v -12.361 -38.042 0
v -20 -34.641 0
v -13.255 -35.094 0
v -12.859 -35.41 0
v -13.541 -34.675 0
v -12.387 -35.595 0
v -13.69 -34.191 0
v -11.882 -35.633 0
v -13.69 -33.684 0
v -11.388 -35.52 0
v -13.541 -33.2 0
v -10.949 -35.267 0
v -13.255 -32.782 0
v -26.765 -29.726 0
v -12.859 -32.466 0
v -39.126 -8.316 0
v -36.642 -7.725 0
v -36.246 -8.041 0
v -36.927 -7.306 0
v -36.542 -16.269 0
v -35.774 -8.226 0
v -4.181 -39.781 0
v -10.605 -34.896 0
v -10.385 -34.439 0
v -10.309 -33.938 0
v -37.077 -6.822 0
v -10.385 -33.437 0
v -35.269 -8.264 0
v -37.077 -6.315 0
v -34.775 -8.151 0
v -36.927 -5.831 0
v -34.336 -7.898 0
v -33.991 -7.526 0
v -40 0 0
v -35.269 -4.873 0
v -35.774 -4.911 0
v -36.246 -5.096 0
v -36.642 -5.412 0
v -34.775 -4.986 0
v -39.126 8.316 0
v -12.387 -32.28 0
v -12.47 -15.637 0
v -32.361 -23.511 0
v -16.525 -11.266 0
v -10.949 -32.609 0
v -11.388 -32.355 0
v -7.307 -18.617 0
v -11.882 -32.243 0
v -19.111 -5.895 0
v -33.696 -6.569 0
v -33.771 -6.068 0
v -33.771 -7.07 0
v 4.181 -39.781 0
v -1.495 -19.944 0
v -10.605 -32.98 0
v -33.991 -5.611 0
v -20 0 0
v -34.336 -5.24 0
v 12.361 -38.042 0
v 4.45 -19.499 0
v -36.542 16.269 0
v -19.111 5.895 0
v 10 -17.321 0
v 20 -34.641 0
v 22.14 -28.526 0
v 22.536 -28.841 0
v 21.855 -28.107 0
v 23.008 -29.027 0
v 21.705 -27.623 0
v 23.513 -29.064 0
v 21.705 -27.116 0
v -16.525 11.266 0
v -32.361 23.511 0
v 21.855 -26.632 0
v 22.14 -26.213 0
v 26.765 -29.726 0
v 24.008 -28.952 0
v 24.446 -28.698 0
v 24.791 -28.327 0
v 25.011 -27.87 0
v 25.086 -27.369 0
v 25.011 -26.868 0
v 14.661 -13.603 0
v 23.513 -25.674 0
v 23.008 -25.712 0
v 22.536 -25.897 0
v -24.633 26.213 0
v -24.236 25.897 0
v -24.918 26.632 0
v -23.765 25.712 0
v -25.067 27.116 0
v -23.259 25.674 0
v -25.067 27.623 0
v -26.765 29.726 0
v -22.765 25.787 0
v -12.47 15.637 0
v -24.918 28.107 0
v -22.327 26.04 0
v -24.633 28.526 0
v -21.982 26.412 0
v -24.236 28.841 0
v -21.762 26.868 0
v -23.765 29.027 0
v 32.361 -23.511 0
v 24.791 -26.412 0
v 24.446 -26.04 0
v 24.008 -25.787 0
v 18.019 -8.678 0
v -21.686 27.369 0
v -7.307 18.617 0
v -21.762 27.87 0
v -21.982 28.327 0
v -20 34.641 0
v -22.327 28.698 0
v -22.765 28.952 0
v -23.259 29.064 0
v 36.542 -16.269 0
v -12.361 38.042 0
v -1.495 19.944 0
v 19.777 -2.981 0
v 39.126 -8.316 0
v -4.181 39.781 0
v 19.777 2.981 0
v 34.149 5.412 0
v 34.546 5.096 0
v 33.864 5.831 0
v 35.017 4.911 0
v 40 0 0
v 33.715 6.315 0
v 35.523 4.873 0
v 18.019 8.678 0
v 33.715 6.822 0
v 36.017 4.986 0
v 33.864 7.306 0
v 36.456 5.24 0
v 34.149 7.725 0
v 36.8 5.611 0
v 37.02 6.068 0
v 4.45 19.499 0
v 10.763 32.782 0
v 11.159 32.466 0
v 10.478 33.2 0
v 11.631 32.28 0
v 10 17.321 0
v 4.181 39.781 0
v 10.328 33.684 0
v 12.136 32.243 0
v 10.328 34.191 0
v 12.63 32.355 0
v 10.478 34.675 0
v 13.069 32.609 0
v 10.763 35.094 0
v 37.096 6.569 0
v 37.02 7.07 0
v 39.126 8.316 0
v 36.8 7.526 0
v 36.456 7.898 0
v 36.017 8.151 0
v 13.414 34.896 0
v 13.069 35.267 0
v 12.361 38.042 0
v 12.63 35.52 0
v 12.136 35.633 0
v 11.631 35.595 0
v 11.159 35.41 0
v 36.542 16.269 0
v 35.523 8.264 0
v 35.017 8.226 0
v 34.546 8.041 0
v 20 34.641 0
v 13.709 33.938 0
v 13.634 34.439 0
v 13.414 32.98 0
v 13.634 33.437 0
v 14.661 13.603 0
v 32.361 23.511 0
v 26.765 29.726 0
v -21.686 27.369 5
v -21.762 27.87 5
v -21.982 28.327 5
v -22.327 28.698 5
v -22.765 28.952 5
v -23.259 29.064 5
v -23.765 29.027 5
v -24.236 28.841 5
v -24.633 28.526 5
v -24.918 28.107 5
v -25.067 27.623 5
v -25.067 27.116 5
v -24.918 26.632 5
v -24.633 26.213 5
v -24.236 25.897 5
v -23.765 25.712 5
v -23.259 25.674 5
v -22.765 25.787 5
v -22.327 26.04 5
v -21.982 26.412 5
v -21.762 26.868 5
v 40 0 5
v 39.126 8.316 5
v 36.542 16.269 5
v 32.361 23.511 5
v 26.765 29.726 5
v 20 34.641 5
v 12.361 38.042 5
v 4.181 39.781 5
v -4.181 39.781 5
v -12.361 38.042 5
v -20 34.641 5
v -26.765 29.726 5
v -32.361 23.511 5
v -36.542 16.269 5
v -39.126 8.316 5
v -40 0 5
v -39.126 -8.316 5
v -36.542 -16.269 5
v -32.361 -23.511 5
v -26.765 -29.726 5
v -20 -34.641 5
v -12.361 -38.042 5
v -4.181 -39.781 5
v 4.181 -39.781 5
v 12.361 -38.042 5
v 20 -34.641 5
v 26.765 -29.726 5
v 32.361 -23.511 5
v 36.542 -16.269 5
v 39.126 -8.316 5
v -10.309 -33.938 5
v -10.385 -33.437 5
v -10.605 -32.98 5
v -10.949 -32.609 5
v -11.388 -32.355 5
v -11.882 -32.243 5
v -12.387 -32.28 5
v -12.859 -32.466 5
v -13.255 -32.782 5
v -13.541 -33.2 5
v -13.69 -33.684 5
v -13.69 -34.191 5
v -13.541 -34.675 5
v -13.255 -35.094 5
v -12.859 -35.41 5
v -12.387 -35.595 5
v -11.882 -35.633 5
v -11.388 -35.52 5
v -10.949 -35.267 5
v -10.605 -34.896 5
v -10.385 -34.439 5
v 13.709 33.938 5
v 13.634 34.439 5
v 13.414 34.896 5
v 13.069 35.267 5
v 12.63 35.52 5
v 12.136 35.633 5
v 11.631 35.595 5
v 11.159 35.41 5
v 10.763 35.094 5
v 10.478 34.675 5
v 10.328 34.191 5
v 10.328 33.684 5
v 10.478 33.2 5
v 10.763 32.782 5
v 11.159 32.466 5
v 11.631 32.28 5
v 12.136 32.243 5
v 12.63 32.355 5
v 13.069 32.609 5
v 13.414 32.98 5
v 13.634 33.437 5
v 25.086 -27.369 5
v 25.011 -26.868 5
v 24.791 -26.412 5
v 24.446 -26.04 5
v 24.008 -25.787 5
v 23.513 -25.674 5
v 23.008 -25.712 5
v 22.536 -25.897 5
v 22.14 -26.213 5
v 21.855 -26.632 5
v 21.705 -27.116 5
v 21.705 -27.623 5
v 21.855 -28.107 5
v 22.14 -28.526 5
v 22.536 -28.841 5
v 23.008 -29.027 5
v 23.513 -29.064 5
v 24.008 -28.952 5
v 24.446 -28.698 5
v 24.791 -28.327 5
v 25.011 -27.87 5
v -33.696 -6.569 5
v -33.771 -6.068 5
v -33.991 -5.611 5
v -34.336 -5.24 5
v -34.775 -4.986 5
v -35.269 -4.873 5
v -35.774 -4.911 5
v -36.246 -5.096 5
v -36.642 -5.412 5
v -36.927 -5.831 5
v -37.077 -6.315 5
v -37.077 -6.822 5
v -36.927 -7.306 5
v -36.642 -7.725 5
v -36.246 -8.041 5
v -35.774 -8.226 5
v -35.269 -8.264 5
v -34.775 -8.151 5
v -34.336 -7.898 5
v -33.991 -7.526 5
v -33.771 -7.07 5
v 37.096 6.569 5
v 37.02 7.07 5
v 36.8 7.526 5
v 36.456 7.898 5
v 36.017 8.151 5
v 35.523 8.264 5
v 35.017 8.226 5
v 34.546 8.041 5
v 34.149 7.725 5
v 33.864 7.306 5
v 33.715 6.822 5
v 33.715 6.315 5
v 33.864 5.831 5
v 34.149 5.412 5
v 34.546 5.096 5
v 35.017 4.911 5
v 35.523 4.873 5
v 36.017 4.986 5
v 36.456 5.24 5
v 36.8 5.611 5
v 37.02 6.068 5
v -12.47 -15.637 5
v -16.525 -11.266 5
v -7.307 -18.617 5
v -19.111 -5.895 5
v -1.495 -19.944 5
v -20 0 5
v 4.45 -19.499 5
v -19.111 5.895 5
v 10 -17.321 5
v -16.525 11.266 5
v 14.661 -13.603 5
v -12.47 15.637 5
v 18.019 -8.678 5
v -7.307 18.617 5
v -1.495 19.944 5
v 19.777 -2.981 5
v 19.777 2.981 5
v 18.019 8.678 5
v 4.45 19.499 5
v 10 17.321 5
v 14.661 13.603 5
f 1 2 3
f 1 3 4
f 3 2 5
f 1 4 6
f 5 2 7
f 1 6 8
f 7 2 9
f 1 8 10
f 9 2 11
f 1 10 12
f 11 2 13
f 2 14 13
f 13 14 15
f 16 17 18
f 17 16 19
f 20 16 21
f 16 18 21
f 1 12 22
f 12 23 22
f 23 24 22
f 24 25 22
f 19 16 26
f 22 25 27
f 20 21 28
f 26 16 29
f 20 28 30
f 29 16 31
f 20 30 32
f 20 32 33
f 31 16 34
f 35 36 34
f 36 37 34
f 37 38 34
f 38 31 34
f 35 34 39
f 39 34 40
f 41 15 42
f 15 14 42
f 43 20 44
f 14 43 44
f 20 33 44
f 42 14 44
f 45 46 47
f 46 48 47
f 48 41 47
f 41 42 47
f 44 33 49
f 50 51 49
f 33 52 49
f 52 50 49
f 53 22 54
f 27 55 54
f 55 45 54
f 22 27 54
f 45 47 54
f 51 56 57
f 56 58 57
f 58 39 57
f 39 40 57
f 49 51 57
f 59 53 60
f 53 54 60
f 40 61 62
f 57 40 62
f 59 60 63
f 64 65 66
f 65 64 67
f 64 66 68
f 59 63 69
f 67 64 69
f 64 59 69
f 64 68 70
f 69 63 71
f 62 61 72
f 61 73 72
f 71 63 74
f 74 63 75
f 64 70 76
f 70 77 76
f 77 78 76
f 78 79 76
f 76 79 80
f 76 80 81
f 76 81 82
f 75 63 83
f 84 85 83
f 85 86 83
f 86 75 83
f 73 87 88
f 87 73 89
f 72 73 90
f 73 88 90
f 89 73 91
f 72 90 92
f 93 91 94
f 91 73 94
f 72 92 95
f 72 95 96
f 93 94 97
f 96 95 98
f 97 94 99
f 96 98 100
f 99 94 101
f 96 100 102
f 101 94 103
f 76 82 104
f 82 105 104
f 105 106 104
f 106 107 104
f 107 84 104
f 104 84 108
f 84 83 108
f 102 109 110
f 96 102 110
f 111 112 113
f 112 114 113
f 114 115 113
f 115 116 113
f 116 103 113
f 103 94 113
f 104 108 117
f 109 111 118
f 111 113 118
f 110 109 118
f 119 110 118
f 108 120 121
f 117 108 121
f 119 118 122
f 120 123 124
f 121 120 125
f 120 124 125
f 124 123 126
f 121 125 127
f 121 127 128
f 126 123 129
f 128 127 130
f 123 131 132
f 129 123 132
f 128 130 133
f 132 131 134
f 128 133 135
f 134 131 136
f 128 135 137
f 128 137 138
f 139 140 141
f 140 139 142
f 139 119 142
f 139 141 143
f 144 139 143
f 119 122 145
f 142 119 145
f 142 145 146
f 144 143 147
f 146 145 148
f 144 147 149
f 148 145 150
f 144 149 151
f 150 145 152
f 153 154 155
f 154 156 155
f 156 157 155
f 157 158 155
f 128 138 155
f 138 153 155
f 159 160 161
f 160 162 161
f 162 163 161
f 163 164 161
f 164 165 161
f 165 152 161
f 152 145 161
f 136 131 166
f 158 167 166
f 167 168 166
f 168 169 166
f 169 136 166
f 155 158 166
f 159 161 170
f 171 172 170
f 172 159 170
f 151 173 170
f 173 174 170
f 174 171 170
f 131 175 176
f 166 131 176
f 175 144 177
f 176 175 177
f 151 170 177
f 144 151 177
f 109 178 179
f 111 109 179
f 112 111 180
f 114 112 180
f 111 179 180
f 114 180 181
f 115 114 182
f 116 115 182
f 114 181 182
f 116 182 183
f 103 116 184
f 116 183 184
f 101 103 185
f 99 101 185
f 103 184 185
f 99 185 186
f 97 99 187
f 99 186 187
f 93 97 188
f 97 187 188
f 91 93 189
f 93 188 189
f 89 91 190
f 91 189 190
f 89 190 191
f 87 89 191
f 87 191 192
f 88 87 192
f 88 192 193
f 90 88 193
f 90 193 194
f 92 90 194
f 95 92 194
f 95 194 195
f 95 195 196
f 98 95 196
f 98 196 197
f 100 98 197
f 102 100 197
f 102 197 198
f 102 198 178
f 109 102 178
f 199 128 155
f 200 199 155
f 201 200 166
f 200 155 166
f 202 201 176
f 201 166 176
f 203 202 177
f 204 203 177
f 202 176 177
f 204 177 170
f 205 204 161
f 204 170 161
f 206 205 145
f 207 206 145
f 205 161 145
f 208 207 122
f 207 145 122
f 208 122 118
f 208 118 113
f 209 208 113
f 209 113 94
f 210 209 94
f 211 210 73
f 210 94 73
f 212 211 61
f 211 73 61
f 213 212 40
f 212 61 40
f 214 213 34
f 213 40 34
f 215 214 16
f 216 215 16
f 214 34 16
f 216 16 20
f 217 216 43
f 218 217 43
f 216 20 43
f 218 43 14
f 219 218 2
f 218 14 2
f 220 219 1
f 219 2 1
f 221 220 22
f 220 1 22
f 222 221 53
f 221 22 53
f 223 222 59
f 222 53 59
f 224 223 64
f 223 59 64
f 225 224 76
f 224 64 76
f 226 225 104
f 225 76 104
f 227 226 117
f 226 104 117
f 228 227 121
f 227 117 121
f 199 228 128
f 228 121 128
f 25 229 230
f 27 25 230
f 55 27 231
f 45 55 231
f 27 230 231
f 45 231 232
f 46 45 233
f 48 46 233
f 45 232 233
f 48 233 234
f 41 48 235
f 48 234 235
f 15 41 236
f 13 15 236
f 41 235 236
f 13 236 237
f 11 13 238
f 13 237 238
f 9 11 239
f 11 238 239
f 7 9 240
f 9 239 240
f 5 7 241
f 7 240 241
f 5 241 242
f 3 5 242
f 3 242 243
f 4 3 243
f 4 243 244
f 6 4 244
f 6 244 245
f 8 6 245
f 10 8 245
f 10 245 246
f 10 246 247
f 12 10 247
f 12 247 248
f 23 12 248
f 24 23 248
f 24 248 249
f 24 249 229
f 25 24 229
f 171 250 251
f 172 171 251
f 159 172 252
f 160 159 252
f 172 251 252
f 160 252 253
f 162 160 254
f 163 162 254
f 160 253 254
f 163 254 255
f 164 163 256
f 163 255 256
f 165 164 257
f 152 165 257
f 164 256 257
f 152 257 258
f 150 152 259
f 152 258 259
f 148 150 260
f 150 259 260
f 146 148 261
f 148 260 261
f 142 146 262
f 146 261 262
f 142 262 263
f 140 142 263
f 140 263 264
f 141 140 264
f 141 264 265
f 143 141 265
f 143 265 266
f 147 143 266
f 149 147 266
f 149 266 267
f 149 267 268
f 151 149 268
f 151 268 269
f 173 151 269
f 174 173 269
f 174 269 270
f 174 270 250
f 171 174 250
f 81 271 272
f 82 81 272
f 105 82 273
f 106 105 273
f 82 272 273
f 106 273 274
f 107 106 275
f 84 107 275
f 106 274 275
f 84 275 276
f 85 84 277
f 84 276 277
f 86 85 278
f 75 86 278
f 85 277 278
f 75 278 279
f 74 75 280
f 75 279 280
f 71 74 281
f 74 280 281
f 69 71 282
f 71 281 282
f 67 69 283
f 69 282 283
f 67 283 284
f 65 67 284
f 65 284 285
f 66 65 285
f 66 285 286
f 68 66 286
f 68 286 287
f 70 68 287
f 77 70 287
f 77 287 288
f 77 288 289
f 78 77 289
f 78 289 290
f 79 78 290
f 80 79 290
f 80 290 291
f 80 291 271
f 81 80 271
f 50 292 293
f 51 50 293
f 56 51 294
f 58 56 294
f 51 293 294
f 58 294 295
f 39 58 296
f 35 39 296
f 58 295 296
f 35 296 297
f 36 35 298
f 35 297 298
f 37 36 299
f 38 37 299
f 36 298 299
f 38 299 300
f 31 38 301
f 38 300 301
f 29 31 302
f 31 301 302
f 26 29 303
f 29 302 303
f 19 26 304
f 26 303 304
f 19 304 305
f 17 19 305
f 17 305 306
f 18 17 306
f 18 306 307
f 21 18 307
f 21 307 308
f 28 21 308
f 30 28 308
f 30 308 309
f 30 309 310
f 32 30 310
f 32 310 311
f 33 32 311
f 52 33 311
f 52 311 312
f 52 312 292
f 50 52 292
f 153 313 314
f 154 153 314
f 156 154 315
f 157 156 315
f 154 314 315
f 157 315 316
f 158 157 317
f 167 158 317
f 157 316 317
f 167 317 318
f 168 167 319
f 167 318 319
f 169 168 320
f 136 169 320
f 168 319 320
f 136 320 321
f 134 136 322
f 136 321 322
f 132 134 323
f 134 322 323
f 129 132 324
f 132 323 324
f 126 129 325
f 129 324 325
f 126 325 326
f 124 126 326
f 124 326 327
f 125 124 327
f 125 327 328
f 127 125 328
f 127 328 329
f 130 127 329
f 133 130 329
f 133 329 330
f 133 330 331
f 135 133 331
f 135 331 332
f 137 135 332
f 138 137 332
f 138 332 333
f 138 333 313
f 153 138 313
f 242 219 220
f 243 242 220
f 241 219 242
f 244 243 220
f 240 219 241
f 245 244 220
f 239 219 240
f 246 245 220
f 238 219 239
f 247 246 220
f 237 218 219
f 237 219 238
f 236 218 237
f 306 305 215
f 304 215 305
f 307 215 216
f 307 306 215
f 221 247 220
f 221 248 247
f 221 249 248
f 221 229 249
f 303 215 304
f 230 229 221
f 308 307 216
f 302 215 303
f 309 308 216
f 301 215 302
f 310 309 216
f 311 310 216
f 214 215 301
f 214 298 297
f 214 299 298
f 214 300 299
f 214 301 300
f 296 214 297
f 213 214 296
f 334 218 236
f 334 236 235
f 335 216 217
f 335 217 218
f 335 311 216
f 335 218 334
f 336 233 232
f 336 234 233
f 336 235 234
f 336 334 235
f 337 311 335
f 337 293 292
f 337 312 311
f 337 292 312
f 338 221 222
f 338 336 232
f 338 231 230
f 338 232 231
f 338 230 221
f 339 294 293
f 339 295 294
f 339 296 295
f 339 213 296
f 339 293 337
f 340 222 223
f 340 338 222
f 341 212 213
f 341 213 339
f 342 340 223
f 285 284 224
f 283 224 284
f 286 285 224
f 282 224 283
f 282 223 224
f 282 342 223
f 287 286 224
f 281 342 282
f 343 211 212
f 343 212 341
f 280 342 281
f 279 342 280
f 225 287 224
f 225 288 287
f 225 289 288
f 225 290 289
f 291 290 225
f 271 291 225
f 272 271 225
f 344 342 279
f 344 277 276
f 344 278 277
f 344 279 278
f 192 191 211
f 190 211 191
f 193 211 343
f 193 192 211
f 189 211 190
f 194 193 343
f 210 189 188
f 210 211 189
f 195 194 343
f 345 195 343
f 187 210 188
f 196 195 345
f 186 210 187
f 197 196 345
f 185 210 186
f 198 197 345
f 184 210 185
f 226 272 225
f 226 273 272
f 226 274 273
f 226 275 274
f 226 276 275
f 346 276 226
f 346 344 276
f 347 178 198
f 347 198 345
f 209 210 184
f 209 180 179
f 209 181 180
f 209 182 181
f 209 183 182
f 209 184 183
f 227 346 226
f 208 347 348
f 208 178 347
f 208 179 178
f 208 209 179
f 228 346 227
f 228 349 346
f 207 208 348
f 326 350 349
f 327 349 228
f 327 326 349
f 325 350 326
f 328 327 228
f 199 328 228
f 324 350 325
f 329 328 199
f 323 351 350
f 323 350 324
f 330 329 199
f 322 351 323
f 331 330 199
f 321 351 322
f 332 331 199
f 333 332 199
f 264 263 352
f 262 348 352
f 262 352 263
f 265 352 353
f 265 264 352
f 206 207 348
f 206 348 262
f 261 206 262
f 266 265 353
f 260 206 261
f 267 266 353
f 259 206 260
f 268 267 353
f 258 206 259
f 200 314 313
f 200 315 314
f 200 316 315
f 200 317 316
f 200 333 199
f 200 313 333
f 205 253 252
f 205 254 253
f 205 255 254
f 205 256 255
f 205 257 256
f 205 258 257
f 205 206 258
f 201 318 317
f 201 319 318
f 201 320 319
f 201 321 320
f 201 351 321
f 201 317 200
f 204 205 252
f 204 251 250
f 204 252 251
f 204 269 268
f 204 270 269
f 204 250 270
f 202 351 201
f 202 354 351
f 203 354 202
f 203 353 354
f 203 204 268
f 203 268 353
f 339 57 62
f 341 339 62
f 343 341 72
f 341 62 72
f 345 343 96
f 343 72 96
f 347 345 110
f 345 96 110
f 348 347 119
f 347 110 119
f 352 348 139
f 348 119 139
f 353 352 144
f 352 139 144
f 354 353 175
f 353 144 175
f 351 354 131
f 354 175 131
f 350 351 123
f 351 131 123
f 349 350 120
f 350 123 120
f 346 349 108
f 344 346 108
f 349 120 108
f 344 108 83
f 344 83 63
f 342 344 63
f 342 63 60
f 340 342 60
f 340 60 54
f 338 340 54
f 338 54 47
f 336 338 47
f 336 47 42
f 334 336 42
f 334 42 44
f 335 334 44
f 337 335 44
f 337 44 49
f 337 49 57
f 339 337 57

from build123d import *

# Parameters (mm, degrees)
SKETCH1_R           = 40
BOSS_EXTRUDE1_DEPTH = 5
SKETCH2_R           = 20
CUT_EXTRUDE1_DEPTH  = 6
SKETCH3_R           = 1.7
CUT_EXTRUDE2_DEPTH  = 6


with BuildPart() as part:
    # Sketch1 → Boss-Extrude1 (new body)
    with BuildSketch(Plane.XY):
        Circle(SKETCH1_R)
    extrude(amount=BOSS_EXTRUDE1_DEPTH)

    # Sketch2 → Cut-Extrude1 (cut, through all)
    with BuildSketch(Plane(origin=(0, 0, 0), x_dir=(-1, 0, 0), z_dir=(0, 0, -1))):
        Circle(SKETCH2_R)
    extrude(amount=-CUT_EXTRUDE1_DEPTH, mode=Mode.SUBTRACT)

    # Sketch3 → Cut-Extrude2 (cut, through all)
    with BuildSketch(Plane.XY.offset(5)):
        with Locations((12.009212016, 33.937867151)):
            Circle(SKETCH3_R)
        with Locations((35.395661111, 6.56865089)):
            Circle(SKETCH3_R)
        with Locations((23.386449095, -27.369216261)):
            Circle(SKETCH3_R)
        with Locations((-12.009212016, -33.937867151)):
            Circle(SKETCH3_R)
        with Locations((-35.395661111, -6.56865089)):
            Circle(SKETCH3_R)
        with Locations((-23.386449095, 27.369216261)):
            Circle(SKETCH3_R)
    extrude(amount=-CUT_EXTRUDE2_DEPTH, mode=Mode.SUBTRACT)


solid = part.part
